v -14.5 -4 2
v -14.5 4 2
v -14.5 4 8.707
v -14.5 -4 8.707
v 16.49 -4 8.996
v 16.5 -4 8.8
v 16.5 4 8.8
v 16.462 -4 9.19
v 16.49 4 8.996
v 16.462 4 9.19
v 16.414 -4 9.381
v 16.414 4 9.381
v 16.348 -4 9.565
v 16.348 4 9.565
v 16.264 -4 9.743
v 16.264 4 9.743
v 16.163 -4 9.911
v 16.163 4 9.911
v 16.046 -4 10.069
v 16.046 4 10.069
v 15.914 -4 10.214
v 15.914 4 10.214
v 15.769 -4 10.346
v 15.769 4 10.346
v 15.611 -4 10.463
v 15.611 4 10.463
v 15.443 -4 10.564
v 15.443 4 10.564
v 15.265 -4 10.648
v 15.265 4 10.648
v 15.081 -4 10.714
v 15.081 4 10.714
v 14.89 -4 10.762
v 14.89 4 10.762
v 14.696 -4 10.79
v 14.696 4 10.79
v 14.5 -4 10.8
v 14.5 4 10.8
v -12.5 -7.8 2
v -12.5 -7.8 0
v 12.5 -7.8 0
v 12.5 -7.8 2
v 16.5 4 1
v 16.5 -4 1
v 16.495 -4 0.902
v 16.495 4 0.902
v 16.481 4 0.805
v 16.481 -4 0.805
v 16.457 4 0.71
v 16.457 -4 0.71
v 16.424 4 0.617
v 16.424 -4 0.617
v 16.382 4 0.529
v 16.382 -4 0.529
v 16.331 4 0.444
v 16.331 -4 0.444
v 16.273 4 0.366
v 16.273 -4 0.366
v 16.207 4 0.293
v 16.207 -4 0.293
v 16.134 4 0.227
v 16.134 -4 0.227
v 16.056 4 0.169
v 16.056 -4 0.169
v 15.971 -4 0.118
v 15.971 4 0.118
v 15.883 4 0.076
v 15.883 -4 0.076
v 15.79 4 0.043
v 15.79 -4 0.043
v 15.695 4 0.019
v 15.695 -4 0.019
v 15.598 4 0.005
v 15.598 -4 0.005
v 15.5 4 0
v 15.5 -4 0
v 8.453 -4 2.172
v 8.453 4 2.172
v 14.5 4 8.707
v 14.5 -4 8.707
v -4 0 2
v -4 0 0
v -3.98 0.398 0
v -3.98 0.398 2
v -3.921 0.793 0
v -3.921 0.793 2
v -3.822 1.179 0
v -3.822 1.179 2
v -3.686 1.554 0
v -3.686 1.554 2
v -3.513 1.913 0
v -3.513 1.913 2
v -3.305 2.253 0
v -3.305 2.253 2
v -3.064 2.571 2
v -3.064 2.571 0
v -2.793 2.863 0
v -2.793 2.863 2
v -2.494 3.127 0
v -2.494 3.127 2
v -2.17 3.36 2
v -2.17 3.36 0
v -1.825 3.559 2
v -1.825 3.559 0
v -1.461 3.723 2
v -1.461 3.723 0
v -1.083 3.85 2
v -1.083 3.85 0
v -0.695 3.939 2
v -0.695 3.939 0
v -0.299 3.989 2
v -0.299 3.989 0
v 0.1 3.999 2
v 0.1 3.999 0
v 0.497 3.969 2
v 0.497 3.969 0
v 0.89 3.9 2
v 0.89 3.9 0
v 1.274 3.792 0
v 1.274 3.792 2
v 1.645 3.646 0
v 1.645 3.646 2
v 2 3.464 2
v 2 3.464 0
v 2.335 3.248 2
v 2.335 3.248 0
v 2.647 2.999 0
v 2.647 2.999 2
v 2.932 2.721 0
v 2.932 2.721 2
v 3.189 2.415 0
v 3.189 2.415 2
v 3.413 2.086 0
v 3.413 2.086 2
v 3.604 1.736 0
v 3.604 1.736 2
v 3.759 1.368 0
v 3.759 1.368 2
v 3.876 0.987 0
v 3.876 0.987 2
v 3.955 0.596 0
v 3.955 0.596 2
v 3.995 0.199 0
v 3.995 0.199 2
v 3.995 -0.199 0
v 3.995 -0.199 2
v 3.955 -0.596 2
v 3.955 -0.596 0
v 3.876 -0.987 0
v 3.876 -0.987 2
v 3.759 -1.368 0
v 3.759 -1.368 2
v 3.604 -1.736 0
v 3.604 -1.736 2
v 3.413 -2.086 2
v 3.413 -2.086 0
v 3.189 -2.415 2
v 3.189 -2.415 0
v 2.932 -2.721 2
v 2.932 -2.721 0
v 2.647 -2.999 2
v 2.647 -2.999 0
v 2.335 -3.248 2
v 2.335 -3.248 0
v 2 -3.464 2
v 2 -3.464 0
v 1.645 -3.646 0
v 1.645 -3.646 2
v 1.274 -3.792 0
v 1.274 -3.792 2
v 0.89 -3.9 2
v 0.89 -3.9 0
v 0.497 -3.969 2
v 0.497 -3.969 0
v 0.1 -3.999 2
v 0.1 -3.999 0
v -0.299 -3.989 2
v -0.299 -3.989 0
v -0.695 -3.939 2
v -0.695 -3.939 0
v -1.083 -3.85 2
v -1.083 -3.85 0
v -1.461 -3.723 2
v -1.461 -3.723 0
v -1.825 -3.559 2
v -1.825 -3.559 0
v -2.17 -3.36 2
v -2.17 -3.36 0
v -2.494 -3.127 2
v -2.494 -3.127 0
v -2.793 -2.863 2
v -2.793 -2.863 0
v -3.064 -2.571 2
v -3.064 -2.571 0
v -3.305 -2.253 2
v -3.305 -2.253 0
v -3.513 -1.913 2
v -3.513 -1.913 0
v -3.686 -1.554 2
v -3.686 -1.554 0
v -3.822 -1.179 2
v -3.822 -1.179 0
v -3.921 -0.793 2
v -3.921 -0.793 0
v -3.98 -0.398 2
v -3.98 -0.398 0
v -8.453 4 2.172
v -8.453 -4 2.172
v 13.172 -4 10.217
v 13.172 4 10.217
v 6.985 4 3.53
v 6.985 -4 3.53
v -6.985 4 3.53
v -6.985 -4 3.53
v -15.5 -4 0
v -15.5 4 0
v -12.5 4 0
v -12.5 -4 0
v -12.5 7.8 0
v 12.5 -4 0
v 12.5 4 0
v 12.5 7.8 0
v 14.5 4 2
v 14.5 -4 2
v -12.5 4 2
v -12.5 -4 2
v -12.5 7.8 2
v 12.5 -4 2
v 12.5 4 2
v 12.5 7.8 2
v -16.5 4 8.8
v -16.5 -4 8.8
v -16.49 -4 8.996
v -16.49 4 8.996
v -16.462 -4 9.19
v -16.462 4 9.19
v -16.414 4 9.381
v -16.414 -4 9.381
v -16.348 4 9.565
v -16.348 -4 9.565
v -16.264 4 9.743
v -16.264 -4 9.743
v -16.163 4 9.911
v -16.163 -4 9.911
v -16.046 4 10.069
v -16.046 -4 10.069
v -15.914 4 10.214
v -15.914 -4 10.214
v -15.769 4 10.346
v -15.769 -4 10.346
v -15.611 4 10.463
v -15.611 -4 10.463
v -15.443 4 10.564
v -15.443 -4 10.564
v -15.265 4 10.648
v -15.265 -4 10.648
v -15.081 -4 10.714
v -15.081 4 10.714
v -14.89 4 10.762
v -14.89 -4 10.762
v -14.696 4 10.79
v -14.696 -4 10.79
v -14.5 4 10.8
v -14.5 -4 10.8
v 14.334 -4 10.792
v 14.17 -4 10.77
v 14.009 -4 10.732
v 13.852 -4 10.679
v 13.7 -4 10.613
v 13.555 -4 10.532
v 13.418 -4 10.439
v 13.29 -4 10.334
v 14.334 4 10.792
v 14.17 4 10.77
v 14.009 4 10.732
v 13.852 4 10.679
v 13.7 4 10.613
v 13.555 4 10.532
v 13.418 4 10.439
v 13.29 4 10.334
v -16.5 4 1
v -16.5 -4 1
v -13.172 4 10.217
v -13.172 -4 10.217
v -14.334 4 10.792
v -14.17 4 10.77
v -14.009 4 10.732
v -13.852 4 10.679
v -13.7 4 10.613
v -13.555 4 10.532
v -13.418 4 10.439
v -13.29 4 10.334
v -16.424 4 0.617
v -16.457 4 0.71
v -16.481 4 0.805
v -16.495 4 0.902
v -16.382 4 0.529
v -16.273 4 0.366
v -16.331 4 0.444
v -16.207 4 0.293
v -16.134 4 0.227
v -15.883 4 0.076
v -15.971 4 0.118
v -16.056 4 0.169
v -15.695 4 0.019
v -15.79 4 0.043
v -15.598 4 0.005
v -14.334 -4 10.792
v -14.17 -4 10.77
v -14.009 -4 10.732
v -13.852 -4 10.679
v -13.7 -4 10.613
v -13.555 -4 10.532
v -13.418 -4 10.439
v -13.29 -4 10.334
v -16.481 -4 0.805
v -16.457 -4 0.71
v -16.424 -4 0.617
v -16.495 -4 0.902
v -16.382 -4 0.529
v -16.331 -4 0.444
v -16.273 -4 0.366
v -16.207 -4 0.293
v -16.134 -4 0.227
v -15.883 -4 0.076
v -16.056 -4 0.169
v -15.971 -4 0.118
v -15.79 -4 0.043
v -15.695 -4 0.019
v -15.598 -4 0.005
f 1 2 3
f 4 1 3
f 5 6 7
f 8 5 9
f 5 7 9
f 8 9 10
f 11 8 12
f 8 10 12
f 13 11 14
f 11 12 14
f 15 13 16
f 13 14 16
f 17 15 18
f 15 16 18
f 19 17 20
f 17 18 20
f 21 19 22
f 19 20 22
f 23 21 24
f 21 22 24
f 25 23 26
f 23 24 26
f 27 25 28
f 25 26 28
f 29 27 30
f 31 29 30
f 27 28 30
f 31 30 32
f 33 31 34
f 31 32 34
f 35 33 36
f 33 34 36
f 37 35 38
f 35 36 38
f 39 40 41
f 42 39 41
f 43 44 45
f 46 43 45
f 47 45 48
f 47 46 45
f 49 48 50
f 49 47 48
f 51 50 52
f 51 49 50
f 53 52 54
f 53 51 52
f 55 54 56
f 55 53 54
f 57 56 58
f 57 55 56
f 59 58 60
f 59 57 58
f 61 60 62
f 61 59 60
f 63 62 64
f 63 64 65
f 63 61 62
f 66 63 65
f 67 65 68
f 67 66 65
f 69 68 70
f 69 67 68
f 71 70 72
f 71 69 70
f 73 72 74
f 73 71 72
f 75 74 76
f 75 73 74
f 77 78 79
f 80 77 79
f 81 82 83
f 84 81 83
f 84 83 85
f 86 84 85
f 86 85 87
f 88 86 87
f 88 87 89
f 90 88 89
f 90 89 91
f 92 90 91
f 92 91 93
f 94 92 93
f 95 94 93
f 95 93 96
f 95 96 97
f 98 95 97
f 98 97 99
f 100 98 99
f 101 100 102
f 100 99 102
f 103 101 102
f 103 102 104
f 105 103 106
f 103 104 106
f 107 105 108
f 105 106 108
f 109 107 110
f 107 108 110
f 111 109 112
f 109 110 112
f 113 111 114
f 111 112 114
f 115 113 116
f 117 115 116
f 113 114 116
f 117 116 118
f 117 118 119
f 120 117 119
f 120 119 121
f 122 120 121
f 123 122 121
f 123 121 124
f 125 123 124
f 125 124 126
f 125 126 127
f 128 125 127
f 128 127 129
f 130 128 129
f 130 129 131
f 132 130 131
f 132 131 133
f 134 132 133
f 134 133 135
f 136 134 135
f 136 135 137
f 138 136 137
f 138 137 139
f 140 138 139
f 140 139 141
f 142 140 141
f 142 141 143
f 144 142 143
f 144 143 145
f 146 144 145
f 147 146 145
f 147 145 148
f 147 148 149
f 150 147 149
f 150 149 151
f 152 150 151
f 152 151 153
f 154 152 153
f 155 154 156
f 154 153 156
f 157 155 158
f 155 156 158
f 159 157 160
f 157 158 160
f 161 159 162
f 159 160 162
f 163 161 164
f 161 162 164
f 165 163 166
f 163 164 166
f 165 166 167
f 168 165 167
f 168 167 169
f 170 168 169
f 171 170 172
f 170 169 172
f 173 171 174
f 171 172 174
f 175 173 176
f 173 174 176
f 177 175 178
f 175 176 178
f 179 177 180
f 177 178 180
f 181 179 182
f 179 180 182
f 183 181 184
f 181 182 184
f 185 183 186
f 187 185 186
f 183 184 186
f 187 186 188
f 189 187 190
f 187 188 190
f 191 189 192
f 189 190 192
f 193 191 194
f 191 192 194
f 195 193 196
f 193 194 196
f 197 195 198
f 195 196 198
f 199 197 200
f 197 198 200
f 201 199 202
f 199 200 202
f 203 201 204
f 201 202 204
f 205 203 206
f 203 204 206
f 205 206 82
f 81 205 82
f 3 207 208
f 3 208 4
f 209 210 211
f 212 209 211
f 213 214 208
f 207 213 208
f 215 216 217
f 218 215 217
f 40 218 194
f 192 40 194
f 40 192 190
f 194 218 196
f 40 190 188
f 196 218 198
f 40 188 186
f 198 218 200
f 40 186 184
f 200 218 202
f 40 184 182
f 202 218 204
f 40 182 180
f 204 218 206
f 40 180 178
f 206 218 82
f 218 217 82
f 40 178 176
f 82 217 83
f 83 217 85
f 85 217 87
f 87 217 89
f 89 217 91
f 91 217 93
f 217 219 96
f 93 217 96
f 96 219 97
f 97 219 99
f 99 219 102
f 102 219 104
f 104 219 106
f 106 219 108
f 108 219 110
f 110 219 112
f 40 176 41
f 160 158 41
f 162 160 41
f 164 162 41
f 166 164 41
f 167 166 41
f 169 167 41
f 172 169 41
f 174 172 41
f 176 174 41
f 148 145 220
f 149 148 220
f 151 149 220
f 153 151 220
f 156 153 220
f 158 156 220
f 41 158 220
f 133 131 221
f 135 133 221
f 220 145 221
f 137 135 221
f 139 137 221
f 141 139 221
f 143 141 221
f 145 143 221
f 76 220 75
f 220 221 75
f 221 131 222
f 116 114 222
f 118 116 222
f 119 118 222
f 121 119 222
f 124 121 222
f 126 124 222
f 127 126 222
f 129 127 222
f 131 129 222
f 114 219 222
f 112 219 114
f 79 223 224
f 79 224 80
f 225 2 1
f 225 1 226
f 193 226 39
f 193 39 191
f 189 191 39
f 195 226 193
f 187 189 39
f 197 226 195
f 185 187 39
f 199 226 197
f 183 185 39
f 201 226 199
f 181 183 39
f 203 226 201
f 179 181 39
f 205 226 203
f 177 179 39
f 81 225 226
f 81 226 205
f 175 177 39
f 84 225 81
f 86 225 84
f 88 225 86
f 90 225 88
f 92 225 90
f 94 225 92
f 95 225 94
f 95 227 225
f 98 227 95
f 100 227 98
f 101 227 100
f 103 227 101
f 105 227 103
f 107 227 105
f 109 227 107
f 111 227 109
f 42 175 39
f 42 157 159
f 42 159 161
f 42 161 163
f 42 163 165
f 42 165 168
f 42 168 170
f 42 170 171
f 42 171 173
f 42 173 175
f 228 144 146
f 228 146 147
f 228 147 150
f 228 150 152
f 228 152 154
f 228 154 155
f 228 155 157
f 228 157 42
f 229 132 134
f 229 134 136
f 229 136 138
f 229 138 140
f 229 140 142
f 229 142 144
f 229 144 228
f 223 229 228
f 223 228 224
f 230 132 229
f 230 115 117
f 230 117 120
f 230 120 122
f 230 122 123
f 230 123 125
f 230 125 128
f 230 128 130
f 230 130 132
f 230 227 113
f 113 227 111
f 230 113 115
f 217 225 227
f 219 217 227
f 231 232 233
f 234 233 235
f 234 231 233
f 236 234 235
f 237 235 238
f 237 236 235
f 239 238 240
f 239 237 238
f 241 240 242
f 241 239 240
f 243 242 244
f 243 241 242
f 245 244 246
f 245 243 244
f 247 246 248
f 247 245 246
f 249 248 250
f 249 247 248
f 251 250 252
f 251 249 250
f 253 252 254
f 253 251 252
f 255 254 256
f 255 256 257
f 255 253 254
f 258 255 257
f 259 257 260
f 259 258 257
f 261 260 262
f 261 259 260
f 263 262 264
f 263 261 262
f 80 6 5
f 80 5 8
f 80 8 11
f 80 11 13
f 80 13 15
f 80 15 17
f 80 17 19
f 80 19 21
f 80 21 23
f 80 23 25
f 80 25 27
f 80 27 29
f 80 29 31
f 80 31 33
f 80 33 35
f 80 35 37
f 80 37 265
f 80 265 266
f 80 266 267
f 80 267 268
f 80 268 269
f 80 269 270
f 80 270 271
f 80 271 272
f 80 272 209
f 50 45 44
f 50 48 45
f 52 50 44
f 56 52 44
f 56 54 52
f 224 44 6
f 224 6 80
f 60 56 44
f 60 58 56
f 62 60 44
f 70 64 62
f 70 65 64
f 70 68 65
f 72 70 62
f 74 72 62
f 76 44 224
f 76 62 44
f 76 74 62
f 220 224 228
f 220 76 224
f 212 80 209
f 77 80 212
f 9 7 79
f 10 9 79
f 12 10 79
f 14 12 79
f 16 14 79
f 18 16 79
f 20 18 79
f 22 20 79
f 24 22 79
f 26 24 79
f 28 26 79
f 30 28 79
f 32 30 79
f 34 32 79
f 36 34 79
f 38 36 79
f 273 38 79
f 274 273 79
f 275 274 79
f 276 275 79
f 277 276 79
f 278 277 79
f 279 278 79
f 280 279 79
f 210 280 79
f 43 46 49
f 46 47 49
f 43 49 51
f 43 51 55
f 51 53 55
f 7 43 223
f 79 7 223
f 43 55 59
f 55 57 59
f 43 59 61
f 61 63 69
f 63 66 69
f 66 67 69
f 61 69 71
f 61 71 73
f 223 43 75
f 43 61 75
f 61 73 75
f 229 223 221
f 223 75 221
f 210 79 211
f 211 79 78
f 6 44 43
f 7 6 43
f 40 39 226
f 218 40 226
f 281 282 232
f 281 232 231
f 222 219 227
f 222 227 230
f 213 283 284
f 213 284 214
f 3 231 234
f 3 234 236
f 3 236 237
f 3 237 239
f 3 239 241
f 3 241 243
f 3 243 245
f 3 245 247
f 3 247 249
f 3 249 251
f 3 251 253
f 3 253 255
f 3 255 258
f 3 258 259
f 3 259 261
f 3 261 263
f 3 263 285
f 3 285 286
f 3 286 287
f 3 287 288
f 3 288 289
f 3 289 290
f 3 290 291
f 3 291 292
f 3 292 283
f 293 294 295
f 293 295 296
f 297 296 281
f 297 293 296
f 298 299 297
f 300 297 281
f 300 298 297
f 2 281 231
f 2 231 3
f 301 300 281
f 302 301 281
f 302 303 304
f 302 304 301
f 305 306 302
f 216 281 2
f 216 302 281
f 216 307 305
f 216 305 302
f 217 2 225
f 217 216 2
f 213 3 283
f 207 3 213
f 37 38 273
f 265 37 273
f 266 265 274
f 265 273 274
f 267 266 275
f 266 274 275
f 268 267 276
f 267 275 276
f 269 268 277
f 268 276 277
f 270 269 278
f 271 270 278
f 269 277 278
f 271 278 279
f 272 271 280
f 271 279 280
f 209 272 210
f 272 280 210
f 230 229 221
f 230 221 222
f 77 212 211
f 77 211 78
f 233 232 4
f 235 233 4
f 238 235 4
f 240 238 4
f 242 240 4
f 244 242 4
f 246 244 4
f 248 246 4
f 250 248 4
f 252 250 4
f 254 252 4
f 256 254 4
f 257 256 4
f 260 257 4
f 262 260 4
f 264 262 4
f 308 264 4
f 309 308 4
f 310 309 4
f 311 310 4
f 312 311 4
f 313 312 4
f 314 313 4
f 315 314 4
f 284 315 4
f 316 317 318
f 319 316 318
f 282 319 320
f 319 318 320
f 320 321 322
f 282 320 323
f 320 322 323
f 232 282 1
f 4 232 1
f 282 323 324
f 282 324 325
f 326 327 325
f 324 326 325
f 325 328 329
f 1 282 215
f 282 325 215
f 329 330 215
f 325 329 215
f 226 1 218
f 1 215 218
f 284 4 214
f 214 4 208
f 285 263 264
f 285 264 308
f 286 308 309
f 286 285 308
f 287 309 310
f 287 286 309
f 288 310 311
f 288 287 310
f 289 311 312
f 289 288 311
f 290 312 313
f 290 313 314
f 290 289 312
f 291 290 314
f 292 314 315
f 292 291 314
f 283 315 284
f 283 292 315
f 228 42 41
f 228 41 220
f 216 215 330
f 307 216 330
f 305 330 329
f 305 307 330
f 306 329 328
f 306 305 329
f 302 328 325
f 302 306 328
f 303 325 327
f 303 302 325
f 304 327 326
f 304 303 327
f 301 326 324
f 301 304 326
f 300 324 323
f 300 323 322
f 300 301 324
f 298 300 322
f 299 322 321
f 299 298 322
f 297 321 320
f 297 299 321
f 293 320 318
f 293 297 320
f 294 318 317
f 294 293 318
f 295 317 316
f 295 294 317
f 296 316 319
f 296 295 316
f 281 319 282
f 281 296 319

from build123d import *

# Parameters (mm, degrees)
SKETCH_1_W          = 33
SKETCH_1_H          = 15.6
EXTRUDE_1_DEPTH     = 2
SKETCH_2_W          = 4
SKETCH_2_H          = 3.8
CUT_EXTRUDE_1_DEPTH = 19.360010893
SKETCH_4_W          = 10.8
SKETCH_4_H          = 8
EXTRUDE_2_DEPTH     = 2
EXTRUDE_4_DEPTH     = 8
SKETCH_6_R          = 4
CUT_EXTRUDE_2_DEPTH = 22.20683852
FILLET_1_R          = 2
FILLET_2_R          = 1


with BuildPart() as part:
    # 草图1 → 凸台-拉伸1 (new body)
    with BuildSketch(Plane.XY):
        Rectangle(SKETCH_1_W, SKETCH_1_H)
    extrude(amount=EXTRUDE_1_DEPTH)

    # 草图2 → 切除-拉伸1 (cut, through all)
    with BuildSketch(Plane.XY.offset(2)):
        with Locations((-14.5, 5.9)):
            Rectangle(SKETCH_2_W, SKETCH_2_H)
        with Locations((14.5, 5.9)):
            Rectangle(SKETCH_2_W, SKETCH_2_H)
        with Locations((-14.5, -5.9)):
            Rectangle(SKETCH_2_W, SKETCH_2_H)
        with Locations((14.5, -5.9)):
            Rectangle(SKETCH_2_W, SKETCH_2_H)
    extrude(amount=-CUT_EXTRUDE_1_DEPTH, mode=Mode.SUBTRACT)

    # 草图4 → 凸台-拉伸2 (add)
    with BuildSketch(Plane.ZY.offset(16.5)):
        with Locations((5.4, 0)):
            Rectangle(SKETCH_4_W, SKETCH_4_H)
    extrude_2 = extrude(amount=-EXTRUDE_2_DEPTH)

    # 草图5 → 凸台-拉伸4 (add)
    with BuildSketch(Plane(origin=(0, 4, 0), x_dir=(1, 0, 0), z_dir=(0, 1, 0))):
        with BuildLine():
            Line((-8.45327815, -2.172085136), (-14.5, -8.707152989))
            Line((-14.5, -8.707152989), (-14.5, -10.8))
            ThreePointArc((-14.5, -10.8), (-13.774891977, -10.64781178), (-13.172160334, -10.216931904))
            Line((-13.172160334, -10.216931904), (-6.985279062, -3.530385058))
            Line((-6.985279062, -3.530385058), (-8.45327815, -2.172085136))
        make_face()
    extrude_4 = extrude(amount=-EXTRUDE_4_DEPTH)

    # 草图6 → 切除-拉伸2 (cut, through all)
    with BuildSketch(Plane(origin=(0, 0, 0), x_dir=(-1, 0, 0), z_dir=(0, 0, -1))):
        Circle(SKETCH_6_R)
    extrude(amount=-CUT_EXTRUDE_2_DEPTH, mode=Mode.SUBTRACT)

    # 镜向2: 凸台-拉伸2 across plane
    add(extrude_2.mirror(Plane(origin=(0, 0, 0), x_dir=(0, 0, 1), z_dir=(1, 0, 0))))

    # 镜向3: 凸台-拉伸4 across plane
    add(extrude_4.mirror(Plane(origin=(0, 0, 0), x_dir=(0, 0, 1), z_dir=(1, 0, 0))))

    # 圆角1
    fillet_1_edges = [part.edges().sort_by_distance(p)[0] for p in [
        (16.5, 0, 10.8),
        (-16.5, 0, 10.8),
    ]]
    fillet(fillet_1_edges, radius=FILLET_1_R - 0.0001)  # a hair under: the kernel refuses the full size

    # 圆角2
    fillet_2_edges = [part.edges().sort_by_distance(p)[0] for p in [
        (-16.5, 0, 0),
        (16.5, 0, 0),
    ]]
    fillet(fillet_2_edges, radius=FILLET_2_R)


solid = part.part
